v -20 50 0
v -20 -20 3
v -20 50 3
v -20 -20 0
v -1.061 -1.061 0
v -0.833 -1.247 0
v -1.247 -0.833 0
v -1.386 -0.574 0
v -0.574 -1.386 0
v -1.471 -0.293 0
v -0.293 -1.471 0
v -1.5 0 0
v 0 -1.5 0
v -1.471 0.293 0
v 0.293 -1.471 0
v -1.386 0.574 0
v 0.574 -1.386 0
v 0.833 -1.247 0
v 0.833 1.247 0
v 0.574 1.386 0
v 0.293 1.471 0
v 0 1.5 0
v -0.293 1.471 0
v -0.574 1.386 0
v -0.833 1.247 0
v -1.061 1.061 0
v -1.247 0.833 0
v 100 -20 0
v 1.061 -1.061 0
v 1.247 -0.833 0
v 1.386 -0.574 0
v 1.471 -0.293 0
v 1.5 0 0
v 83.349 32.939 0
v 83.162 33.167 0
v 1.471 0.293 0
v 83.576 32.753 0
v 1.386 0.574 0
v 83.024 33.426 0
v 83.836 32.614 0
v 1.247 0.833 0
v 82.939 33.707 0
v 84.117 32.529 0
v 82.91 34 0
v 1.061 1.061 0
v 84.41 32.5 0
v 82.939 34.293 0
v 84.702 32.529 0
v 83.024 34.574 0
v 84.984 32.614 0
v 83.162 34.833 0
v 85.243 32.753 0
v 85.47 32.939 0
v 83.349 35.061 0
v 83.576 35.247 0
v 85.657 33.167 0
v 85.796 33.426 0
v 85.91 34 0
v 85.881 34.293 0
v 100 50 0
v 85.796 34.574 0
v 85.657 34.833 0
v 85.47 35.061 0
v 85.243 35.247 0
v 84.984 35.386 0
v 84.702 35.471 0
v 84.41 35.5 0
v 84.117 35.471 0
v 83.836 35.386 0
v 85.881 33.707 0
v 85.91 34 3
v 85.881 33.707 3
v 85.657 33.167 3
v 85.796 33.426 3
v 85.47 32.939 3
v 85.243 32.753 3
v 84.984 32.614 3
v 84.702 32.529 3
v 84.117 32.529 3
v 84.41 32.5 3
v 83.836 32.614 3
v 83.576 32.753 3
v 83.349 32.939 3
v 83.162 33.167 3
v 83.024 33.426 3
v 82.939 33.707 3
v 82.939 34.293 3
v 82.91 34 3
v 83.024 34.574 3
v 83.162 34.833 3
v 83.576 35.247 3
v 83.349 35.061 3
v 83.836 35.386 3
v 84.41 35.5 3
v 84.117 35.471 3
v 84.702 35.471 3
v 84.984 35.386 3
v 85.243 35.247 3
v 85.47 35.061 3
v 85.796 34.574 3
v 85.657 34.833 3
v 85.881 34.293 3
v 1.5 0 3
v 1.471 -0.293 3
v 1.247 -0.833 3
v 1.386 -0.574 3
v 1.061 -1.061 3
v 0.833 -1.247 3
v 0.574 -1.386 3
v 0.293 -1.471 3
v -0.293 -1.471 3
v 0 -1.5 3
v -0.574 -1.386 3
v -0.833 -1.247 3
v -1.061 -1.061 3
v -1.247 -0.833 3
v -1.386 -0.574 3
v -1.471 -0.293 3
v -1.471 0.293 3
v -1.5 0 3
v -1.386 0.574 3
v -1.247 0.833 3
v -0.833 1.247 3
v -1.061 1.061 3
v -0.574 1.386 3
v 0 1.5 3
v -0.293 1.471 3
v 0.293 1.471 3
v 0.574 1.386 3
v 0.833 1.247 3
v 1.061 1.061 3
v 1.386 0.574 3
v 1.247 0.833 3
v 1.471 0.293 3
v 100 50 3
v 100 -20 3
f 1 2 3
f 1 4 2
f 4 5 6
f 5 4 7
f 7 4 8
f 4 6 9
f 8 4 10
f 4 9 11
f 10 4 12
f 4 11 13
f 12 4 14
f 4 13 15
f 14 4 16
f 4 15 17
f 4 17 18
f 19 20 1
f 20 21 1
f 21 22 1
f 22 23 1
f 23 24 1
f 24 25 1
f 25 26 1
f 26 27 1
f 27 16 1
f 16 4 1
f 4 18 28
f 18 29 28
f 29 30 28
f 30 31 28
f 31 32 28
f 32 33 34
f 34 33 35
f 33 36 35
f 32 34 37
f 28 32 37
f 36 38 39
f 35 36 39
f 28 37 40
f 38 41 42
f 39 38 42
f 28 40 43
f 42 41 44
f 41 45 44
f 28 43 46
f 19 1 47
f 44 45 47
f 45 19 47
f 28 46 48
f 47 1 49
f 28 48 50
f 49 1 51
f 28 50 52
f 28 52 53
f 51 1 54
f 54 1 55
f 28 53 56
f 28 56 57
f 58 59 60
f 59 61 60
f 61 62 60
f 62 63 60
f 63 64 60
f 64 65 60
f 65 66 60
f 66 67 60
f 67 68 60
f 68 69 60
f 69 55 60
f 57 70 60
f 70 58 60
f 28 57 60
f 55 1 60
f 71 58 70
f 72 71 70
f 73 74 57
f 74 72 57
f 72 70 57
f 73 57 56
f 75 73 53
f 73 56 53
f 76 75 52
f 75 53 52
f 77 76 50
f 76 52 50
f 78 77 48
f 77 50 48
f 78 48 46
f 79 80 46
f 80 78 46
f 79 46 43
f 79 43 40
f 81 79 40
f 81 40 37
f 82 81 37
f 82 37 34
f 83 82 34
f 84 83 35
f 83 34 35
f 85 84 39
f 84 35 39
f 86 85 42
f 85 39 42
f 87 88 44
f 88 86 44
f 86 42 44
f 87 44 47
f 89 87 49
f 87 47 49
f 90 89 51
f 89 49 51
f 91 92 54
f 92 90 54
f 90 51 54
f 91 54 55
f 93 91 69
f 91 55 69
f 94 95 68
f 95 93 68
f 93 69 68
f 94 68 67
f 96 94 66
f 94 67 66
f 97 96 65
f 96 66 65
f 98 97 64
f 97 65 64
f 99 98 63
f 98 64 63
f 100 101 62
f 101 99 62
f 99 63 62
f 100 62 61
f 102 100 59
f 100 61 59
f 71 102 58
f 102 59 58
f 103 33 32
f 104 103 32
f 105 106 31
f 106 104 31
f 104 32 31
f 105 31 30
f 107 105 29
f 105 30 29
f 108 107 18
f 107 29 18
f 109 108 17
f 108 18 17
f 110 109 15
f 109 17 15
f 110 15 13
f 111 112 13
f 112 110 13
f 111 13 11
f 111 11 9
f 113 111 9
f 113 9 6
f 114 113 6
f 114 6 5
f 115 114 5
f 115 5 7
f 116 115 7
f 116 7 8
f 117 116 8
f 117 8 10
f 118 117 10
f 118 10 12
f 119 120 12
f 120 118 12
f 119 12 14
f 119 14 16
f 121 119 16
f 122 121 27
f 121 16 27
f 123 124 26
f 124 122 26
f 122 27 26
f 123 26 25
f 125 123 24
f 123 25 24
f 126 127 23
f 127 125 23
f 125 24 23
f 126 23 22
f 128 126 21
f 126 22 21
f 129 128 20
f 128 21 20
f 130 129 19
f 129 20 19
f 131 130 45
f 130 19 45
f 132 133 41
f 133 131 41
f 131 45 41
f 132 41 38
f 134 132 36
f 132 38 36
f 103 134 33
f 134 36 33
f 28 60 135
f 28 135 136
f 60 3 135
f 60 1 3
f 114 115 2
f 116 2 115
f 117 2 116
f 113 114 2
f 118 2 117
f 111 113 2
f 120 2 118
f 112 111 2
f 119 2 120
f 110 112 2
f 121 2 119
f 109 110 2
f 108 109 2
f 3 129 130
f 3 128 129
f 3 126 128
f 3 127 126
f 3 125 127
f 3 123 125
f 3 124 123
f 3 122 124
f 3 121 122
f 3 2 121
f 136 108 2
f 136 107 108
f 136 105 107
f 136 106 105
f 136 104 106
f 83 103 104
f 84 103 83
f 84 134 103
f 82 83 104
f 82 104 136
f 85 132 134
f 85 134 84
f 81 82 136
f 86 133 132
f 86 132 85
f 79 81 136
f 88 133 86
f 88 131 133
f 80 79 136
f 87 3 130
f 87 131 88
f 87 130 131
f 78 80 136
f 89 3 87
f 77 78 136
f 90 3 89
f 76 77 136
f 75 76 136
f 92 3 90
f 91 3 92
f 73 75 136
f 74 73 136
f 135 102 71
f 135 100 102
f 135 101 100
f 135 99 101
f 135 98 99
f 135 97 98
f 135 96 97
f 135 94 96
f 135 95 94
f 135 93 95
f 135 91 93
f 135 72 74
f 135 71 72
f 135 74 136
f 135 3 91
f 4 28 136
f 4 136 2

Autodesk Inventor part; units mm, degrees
ref_plane "YZ Plane" through (0, 0, 0) normal (1, 0, 0) x (0, 1, 0)
ref_plane "XZ Plane" through (0, 0, 0) normal (0, 1, 0) x (-1, 0, 0)
ref_plane "XY Plane" through (0, 0, 0) normal (0, 0, 1) x (1, 0, 0)
sketch "スケッチ1" plane through (0, 0, 0) normal (0, 0, 1) x (1, 0, 0)
  circle A0 centre (0, 0) radius 1.5
  circle A1 centre (84.4097, 34) radius 1.5
  line L0 (-20, 50) -> (100, 50)
  line L1 (100, 50) -> (100, -20)
  line L2 (100, -20) -> (-20, -20)
  line L3 (-20, -20) -> (-20, 50)
  dimension "d0" = 3
  dimension "d1" = 3
  dimension "d2" = 91
  dimension "d3" = 34
extrude "押し出し1" add sketch "スケッチ1" along normal blind 3
properties part number "足フレームの代わり"
